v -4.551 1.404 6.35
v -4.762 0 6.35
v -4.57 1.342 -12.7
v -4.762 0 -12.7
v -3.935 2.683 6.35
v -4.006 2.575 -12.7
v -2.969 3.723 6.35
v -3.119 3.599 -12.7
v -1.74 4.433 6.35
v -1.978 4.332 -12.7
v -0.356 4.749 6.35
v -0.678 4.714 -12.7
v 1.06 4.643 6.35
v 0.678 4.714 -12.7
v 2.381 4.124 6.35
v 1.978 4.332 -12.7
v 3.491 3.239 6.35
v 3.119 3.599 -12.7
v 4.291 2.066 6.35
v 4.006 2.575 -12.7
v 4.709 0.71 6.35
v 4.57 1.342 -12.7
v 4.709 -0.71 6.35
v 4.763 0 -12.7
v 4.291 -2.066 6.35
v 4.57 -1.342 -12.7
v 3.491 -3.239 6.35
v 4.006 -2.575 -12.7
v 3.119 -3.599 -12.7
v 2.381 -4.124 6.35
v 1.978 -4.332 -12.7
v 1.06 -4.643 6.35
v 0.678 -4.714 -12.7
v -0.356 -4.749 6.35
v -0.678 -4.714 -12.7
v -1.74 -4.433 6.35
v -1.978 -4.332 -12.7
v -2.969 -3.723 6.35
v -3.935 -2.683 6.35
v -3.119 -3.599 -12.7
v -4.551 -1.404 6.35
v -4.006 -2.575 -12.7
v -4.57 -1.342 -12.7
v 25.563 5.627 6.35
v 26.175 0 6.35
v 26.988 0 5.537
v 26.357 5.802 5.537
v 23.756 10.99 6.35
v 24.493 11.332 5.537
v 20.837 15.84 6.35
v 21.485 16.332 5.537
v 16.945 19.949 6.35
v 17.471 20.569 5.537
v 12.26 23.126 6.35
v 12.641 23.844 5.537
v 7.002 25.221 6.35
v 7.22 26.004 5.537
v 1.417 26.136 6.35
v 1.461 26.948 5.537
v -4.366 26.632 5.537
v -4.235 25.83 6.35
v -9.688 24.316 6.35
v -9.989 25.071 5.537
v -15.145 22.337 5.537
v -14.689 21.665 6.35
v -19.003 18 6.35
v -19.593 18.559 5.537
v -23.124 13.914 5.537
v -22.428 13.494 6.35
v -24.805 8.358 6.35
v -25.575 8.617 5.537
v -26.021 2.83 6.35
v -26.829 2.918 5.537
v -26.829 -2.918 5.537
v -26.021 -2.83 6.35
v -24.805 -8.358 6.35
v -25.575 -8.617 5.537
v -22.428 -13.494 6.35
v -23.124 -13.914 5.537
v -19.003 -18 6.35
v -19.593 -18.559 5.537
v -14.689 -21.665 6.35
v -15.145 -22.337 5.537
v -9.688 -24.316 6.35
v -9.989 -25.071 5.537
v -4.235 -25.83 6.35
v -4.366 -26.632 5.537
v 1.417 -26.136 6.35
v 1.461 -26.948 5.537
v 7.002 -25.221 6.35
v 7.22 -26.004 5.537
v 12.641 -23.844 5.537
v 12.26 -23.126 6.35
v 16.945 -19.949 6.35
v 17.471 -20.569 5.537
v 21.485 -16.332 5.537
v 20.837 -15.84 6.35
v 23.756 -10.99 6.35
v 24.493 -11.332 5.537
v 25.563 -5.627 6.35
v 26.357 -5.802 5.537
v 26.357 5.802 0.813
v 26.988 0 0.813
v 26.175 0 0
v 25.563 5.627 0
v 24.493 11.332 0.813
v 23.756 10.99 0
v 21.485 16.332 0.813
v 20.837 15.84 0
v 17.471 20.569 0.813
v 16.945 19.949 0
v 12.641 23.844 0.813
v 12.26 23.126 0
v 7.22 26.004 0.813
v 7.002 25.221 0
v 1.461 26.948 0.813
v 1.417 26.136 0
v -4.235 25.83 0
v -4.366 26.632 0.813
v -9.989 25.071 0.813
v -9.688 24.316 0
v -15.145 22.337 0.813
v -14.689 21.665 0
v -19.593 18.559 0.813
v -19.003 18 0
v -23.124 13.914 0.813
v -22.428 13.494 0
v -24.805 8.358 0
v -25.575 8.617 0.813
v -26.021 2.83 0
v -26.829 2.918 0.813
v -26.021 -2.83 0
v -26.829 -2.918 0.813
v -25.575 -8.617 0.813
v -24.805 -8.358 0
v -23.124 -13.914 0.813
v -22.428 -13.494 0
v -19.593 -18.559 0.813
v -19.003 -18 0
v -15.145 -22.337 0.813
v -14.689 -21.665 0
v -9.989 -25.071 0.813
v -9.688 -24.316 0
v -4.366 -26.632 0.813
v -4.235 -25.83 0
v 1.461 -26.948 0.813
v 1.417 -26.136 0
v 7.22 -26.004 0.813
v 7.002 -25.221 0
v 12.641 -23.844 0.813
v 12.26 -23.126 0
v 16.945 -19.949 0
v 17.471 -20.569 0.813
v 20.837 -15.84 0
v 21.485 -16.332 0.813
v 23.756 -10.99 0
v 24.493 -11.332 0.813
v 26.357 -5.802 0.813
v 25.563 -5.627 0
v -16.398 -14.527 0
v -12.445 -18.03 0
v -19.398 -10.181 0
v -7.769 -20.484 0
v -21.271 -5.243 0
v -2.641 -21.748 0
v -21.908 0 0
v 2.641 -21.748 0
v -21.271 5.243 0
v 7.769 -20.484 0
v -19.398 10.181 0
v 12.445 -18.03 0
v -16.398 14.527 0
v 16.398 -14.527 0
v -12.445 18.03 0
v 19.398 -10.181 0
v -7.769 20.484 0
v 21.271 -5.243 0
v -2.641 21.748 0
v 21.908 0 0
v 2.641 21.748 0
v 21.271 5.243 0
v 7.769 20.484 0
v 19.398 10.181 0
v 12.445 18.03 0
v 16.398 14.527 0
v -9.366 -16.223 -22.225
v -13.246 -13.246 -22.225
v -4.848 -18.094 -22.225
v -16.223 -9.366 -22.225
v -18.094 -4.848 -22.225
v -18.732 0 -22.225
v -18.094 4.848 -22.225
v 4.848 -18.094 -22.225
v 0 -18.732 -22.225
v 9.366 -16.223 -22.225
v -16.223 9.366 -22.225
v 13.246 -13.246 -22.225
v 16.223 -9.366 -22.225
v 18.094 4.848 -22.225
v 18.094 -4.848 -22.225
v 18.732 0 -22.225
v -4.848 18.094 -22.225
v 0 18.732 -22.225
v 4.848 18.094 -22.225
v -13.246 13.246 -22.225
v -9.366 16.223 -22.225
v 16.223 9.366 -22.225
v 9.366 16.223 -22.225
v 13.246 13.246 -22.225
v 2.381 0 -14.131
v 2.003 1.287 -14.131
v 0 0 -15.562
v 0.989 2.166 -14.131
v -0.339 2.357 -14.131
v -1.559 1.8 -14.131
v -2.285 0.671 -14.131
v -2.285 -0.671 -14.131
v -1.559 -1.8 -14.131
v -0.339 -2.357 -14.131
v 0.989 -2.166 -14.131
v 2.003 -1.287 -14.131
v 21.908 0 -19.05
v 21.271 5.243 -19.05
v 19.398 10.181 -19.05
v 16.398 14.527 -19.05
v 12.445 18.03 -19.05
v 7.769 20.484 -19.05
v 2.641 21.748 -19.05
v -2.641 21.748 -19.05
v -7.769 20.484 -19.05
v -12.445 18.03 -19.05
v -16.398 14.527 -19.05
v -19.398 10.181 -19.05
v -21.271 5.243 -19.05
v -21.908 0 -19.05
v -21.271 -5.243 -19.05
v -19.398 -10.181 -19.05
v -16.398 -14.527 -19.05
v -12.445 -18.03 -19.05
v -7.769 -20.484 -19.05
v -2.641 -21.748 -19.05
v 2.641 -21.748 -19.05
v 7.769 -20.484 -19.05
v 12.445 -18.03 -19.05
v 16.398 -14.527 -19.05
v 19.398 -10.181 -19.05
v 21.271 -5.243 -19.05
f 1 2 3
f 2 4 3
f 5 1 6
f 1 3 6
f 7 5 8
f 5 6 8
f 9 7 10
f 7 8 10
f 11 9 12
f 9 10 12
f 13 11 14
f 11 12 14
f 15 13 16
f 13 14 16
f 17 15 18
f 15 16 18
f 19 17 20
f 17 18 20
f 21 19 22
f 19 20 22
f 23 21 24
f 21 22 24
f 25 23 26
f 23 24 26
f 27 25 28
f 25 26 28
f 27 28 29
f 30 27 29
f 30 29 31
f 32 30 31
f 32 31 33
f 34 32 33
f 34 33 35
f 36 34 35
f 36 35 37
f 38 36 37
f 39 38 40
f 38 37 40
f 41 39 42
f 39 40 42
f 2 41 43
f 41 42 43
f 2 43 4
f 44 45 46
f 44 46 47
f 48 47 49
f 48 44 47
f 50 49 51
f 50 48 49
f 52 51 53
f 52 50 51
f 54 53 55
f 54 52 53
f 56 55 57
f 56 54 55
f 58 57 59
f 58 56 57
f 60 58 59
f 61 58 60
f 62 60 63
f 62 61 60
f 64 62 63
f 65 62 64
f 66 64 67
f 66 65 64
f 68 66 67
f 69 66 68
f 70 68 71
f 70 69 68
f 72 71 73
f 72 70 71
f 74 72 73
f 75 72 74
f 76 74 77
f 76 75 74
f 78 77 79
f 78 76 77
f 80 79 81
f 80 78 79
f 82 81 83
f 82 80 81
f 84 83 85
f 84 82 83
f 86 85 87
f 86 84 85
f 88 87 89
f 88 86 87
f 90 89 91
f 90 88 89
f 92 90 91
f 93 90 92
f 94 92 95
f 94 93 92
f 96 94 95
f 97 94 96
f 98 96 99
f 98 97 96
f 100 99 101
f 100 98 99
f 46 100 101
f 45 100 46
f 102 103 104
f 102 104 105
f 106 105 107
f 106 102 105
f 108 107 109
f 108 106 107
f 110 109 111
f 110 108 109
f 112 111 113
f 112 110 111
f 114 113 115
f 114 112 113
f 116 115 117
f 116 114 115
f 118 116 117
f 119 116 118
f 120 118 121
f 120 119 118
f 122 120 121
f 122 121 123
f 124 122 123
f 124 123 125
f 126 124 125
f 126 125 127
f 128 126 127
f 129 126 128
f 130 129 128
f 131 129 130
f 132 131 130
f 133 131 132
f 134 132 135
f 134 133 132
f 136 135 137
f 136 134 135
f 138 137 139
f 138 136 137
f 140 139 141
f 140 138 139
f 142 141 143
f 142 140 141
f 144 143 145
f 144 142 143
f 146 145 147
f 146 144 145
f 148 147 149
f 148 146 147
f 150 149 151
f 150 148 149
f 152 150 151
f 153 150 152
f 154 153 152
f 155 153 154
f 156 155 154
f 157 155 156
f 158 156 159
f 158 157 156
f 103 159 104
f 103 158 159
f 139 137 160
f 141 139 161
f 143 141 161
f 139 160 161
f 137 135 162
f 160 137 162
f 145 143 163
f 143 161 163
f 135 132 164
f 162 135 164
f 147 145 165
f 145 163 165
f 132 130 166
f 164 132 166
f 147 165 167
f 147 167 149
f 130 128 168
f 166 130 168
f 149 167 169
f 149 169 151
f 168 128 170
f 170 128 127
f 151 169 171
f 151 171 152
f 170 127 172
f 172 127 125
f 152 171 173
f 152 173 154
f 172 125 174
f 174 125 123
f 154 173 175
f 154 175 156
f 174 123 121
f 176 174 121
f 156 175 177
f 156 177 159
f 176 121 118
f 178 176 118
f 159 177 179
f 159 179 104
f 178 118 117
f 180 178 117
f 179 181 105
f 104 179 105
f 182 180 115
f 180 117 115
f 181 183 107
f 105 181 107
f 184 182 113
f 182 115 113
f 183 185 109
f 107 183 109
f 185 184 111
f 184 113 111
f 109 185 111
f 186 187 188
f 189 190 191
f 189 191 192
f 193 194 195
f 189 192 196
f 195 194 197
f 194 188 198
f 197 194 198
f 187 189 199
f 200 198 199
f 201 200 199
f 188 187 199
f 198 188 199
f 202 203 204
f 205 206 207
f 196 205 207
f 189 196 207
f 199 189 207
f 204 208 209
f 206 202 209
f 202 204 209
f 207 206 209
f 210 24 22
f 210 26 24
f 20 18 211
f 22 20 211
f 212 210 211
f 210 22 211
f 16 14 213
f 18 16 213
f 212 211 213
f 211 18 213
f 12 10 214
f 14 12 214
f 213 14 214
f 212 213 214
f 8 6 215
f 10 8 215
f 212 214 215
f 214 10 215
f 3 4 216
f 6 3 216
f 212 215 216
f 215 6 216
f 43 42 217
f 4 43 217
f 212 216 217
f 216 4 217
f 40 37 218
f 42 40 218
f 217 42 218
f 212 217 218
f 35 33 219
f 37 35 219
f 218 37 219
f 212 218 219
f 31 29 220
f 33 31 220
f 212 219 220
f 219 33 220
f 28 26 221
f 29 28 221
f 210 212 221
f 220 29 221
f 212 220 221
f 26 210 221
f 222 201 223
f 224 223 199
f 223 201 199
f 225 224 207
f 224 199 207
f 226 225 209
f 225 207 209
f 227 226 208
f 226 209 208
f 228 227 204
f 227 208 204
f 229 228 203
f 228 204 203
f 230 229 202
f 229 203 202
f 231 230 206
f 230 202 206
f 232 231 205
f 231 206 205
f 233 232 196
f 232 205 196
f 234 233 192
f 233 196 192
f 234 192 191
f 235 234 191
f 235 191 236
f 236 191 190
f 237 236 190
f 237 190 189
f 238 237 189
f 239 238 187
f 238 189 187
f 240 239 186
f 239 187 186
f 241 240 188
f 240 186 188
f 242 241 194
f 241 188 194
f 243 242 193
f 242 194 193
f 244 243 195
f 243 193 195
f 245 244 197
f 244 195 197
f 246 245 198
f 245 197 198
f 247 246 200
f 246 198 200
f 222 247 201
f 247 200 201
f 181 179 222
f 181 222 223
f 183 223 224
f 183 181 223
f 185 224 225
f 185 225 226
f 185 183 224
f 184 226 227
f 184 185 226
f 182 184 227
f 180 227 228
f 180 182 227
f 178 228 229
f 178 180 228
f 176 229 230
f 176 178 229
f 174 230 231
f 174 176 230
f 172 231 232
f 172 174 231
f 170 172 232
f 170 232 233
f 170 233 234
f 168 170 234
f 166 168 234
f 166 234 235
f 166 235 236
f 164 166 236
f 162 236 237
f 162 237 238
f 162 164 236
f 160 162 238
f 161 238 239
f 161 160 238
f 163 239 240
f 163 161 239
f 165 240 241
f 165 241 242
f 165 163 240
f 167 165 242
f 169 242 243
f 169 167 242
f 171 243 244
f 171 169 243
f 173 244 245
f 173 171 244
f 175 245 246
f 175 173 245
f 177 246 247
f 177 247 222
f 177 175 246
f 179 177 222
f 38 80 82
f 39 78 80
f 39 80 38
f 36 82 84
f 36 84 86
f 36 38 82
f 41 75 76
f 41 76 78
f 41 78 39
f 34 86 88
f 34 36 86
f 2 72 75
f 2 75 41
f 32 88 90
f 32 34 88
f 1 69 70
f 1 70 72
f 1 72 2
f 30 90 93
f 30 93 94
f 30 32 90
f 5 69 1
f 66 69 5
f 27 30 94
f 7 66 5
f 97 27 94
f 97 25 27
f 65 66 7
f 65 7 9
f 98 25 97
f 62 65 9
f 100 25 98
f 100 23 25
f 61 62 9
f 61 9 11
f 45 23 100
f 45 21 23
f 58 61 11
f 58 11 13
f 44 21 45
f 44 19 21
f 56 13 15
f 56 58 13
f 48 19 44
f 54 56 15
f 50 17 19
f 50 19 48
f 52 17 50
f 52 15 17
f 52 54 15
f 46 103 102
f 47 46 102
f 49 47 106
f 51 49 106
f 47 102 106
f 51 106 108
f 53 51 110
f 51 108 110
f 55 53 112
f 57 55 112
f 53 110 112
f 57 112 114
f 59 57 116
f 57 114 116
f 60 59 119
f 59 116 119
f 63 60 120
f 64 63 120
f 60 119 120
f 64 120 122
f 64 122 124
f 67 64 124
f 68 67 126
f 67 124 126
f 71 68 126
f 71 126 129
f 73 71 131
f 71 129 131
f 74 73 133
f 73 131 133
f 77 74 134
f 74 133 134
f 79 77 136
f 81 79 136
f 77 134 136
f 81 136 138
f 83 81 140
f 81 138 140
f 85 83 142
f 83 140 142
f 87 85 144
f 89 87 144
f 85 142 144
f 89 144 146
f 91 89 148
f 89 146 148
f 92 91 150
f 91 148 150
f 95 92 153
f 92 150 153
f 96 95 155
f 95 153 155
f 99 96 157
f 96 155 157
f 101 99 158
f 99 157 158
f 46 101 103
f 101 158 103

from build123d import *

# Parameters (mm, degrees)
F0_R     = 21.9075
F1_DEPTH = 22.225
F0_R_2   = 26.9875
F2_DEPTH = 6.35
F3_SIZE  = 3.175
F4_SIZE  = 0.8128
F6_D     = 9.525
F6_DEPTH = 19.05
F6_TIP   = 2.8615986981


with BuildPart() as f1:
    # F0 (on Top) → F1 (new body)
    with BuildSketch(Plane.XY):
        Circle(F0_R)
    extrude(amount=-F1_DEPTH)

    # F0 (on Top) → F2 (join)
    with BuildSketch(Plane.XY):
        Circle(F0_R_2)
        Circle(F0_R, mode=Mode.SUBTRACT)
        Circle(F0_R)
    extrude(amount=F2_DEPTH)

    # F3
    f3_edges = [f1.edges().sort_by_distance(p)[0] for p in [
        (-21.9075, 0, -22.225),
    ]]
    chamfer(f3_edges, length=F3_SIZE)

    # F4
    f4_edges = [f1.edges().sort_by_distance(p)[0] for p in [
        (-26.9875, 0, 0),
        (-26.9875, 0, 6.35),
    ]]
    chamfer(f4_edges, length=F4_SIZE)

    # F6
    with Locations(Plane.XY.offset(6.35)):
        with Locations((0, 0)):
            Hole(F6_D / 2, depth=F6_DEPTH)
            with Locations((0, 0, -(F6_DEPTH + F6_TIP / 2))):  # 118° drill point
                Cone(0, F6_D / 2, F6_TIP, mode=Mode.SUBTRACT)


solid = f1.part
